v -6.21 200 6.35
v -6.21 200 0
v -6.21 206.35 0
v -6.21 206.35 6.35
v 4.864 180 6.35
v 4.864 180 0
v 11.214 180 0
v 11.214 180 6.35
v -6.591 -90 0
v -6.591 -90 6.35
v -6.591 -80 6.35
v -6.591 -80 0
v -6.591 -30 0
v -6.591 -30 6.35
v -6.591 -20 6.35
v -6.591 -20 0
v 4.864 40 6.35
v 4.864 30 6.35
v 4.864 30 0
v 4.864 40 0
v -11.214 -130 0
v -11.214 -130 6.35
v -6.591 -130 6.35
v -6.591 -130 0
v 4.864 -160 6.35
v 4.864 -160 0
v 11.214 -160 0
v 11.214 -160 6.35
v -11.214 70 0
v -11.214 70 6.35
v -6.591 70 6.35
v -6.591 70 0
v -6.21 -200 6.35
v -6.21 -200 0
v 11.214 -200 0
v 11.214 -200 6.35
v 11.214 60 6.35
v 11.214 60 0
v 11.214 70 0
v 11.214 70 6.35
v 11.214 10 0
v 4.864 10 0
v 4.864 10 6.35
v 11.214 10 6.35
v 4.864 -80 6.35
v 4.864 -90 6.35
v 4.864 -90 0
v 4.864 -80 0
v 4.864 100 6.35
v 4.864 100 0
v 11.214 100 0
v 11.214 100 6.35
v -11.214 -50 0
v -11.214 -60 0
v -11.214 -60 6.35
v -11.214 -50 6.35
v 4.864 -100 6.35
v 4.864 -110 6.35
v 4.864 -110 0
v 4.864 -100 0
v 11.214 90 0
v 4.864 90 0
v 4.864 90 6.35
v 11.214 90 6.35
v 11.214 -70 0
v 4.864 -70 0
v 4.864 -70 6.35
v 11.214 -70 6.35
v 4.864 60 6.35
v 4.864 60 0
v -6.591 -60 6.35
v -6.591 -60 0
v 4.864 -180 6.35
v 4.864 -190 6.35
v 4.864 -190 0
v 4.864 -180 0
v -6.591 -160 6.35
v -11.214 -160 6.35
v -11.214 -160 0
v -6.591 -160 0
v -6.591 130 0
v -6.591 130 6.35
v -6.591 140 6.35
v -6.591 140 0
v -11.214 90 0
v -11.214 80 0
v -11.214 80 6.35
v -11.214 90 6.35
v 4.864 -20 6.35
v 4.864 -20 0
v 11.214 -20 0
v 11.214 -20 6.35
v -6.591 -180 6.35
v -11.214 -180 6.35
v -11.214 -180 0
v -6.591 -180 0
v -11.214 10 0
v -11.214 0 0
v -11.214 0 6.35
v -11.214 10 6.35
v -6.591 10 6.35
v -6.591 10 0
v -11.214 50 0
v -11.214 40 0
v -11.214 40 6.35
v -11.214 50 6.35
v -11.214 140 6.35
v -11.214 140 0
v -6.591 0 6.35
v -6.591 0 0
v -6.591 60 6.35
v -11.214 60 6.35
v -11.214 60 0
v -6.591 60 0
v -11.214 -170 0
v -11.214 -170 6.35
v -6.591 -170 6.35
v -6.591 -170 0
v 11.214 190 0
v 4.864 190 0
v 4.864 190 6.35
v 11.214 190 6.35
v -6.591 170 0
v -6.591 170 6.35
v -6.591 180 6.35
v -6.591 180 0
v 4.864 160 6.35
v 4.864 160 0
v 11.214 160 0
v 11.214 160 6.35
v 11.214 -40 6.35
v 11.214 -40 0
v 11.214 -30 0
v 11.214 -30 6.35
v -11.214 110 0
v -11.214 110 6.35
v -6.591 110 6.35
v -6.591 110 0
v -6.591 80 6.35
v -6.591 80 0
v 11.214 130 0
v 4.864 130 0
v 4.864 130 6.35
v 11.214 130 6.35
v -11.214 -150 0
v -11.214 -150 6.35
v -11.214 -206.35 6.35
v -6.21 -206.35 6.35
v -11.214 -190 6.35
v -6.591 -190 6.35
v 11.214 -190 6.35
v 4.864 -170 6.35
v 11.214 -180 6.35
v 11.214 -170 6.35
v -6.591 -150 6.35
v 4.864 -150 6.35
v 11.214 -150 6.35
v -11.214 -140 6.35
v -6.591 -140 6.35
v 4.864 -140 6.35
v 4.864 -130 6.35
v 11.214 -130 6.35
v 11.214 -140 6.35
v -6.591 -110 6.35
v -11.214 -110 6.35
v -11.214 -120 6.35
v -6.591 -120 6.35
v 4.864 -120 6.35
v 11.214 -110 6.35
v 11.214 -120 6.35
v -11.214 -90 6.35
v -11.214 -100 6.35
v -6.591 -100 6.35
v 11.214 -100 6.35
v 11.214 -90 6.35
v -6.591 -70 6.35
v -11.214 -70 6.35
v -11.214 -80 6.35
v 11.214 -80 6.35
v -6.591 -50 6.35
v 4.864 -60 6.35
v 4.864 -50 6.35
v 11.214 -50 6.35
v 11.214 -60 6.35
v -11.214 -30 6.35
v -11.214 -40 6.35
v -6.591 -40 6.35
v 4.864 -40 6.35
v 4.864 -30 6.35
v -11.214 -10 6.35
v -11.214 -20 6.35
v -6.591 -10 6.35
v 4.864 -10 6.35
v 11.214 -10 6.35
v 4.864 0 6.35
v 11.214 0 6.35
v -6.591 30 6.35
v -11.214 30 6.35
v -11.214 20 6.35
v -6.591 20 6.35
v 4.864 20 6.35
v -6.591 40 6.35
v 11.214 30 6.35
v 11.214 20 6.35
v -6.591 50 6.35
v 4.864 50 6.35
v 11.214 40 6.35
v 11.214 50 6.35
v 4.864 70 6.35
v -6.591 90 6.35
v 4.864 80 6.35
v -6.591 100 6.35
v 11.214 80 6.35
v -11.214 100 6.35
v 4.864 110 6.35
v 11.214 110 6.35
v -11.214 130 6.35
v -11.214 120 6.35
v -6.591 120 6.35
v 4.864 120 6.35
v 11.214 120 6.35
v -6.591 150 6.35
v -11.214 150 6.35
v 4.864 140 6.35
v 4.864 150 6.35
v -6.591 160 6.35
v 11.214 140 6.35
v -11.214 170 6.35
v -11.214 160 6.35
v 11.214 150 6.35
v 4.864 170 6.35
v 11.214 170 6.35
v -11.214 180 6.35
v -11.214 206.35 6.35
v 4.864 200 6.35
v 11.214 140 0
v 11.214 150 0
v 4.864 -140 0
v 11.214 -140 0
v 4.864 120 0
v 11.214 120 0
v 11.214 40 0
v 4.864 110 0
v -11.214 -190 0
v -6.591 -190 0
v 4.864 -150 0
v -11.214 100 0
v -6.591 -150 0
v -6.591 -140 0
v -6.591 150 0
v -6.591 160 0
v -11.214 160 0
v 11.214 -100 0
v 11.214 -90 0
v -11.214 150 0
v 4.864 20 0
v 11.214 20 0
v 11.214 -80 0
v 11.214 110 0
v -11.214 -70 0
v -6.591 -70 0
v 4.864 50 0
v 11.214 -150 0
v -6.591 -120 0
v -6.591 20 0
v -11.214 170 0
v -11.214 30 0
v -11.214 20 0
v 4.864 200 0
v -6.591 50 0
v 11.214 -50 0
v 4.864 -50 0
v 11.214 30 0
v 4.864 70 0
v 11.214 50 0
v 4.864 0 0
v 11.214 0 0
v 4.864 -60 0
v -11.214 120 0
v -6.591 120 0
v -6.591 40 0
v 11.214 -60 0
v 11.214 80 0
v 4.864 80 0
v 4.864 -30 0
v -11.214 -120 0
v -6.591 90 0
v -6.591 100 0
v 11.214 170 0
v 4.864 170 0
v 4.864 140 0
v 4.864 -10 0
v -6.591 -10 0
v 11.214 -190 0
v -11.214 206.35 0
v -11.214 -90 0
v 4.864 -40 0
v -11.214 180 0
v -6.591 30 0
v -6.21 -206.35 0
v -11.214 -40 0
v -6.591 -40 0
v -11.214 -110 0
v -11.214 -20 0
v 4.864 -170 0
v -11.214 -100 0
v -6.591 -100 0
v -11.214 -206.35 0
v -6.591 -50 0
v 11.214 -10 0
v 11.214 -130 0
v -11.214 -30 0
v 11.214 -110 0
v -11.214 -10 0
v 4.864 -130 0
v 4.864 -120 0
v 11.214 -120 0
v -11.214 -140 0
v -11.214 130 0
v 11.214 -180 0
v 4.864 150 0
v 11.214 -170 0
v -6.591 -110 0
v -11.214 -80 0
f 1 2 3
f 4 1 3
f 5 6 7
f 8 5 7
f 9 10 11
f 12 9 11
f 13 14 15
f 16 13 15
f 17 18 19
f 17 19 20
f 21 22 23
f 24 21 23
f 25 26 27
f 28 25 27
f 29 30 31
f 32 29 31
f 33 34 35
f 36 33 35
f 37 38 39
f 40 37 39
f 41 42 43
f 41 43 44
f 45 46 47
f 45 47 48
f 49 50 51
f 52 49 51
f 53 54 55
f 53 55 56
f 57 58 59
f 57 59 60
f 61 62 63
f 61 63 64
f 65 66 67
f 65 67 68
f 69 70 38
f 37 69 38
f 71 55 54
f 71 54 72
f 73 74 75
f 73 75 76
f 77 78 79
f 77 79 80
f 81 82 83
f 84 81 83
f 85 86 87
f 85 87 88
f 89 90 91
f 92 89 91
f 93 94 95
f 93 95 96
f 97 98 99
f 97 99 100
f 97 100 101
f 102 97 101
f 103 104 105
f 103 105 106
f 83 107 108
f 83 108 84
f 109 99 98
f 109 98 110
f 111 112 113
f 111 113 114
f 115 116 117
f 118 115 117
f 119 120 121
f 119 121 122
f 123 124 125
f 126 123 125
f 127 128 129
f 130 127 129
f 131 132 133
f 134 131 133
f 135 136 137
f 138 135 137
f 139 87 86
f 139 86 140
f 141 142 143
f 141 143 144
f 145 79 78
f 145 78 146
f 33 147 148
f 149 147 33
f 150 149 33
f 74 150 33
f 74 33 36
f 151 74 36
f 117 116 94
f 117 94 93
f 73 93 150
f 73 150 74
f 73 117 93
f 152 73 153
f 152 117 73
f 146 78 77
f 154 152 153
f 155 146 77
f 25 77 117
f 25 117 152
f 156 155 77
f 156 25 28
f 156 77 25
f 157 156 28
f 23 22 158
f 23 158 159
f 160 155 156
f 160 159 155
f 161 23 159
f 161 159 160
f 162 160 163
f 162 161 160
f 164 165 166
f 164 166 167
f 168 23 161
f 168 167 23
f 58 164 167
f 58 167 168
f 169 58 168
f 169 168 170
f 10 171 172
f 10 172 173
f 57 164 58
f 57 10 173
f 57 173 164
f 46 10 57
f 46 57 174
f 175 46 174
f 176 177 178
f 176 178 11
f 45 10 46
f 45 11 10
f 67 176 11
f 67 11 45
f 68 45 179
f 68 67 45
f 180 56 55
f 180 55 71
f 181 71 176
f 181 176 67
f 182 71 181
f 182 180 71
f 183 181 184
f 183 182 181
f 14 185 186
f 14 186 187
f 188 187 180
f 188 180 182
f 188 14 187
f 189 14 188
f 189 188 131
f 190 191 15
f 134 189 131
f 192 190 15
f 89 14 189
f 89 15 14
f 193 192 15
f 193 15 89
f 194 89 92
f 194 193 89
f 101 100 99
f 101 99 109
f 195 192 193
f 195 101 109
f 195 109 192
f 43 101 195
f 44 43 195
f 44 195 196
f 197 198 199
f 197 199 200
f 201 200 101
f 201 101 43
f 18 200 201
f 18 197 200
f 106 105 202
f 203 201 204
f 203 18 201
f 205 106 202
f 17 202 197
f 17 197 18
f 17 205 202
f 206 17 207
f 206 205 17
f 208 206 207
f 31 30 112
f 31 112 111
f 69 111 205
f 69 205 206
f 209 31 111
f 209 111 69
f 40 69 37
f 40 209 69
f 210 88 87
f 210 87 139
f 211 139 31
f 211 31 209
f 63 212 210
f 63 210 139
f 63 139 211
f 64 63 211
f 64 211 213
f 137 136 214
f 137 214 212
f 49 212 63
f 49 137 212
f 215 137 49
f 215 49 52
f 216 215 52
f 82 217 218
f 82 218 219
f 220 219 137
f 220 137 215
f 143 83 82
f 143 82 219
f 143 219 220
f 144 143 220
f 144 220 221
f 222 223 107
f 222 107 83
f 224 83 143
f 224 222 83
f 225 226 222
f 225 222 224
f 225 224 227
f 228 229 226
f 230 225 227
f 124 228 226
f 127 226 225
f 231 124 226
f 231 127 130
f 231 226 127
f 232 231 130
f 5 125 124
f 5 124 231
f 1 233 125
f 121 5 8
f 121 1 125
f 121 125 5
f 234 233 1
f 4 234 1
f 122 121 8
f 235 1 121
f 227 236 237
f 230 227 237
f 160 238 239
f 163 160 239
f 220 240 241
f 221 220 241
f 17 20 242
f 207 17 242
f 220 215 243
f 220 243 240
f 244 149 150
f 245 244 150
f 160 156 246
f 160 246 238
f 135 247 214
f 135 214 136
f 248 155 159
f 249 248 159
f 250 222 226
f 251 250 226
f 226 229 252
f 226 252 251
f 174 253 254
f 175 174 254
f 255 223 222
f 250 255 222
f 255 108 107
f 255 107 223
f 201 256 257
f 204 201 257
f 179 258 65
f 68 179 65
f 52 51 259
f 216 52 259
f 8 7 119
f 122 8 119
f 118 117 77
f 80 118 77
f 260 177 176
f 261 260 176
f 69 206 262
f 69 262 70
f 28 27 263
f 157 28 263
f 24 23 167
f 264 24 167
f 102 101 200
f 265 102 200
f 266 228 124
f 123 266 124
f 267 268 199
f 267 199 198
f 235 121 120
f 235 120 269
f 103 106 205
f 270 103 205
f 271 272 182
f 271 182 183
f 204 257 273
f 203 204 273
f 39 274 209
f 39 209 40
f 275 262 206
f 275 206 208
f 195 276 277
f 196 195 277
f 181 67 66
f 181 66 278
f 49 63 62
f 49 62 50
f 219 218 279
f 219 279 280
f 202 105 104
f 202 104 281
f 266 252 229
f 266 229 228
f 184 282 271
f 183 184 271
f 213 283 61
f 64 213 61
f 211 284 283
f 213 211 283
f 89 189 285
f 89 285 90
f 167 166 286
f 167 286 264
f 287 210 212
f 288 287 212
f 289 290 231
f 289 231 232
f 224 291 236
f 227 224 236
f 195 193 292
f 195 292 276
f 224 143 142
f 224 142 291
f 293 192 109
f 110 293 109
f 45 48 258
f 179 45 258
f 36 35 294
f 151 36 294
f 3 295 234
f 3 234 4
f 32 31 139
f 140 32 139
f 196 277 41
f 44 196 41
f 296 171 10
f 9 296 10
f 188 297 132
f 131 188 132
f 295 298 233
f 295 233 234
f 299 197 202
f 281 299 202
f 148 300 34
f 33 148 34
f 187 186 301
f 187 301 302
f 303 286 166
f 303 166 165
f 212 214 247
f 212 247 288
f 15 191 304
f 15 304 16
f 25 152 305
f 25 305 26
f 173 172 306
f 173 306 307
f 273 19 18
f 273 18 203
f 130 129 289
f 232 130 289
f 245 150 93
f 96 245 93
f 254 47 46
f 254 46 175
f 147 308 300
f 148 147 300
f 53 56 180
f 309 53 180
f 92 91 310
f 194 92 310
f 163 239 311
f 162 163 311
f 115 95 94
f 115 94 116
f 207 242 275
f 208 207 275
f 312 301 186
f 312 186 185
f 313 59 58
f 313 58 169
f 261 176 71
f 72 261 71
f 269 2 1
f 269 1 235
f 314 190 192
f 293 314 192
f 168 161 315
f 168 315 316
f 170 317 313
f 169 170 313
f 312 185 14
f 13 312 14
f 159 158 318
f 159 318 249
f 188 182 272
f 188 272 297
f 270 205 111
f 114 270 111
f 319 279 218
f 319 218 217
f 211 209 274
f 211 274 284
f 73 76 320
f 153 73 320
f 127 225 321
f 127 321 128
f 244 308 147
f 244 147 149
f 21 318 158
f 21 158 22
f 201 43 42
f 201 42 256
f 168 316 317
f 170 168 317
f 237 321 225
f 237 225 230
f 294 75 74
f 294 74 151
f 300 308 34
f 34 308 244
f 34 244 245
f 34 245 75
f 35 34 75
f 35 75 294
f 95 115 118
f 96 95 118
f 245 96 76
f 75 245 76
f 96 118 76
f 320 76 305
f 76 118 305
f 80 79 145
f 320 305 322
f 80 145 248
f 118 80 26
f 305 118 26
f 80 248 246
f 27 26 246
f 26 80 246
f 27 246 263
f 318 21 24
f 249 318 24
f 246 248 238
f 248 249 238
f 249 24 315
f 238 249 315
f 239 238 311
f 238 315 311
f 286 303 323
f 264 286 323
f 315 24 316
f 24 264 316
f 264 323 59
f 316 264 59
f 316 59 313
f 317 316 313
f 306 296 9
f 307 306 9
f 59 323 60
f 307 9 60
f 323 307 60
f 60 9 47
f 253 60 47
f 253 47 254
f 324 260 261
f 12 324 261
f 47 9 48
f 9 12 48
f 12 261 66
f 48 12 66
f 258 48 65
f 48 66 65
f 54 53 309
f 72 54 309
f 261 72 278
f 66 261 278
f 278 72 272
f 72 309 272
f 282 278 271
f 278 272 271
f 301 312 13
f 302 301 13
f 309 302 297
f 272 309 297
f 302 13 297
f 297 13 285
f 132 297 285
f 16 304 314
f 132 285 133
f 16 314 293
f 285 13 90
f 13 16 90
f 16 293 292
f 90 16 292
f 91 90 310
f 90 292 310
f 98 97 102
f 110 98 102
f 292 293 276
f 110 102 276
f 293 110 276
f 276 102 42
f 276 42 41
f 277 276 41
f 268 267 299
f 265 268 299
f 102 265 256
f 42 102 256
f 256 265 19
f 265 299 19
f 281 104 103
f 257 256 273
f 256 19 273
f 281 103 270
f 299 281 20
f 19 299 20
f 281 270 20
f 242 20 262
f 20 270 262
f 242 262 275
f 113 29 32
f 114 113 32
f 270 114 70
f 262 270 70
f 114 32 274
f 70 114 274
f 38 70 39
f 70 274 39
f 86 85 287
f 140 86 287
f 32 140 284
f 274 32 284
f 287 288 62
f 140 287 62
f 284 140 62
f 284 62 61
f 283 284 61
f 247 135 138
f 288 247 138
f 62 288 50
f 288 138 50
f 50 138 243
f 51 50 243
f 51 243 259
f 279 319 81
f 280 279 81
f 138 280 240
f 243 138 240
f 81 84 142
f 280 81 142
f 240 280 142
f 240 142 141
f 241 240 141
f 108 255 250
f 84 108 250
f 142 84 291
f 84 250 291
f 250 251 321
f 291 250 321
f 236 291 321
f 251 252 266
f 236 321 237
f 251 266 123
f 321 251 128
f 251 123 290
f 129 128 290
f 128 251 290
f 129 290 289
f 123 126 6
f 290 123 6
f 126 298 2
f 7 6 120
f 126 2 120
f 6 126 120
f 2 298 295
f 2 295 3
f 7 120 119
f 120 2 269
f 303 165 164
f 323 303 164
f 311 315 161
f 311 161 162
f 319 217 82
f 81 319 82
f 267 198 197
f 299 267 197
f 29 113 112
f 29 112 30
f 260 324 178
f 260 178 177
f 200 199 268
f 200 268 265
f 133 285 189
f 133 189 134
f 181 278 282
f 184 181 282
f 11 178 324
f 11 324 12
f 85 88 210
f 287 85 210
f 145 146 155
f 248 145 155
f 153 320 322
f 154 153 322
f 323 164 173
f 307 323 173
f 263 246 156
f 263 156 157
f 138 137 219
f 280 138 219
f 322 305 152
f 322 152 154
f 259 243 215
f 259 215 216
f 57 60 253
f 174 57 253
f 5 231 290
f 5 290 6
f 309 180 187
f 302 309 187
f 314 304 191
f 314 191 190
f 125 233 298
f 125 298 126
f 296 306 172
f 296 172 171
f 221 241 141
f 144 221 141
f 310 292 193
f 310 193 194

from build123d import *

# Parameters (mm, degrees)
SKETCH1_W           = 22.4282
SKETCH1_H           = 400
BOSS_EXTRUDE1_DEPTH = 6.35
SKETCH2_W           = 4.6228
SKETCH2_H           = 10
CUT_EXTRUDE2_DEPTH  = 6.35
SKETCH13_W          = 6.35
SKETCH13_H          = 10
CUT_EXTRUDE4_DEPTH  = 6.35
LPATTERN1_COUNT     = 19
LPATTERN1_PITCH     = 20
LPATTERN2_COUNT     = 20
LPATTERN2_PITCH     = 20
SKETCH14_W          = 5.0038
SKETCH14_H          = 6.35
BOSS_EXTRUDE4_DEPTH = 6.35


with BuildPart() as part:
    # Sketch1 → Boss-Extrude1 (new body)
    with BuildSketch(Plane.XY):
        Rectangle(SKETCH1_W, SKETCH1_H)
    extrude(amount=BOSS_EXTRUDE1_DEPTH)

    # Sketch2 → Cut-Extrude2 (cut)
    with BuildSketch(Plane.XY.offset(6.35)):
        with Locations((-8.9027, -185)):
            Rectangle(SKETCH2_W, SKETCH2_H)
    cut_extrude2 = extrude(amount=-CUT_EXTRUDE2_DEPTH, mode=Mode.SUBTRACT)

    # Sketch13 → Cut-Extrude4 (cut)
    with BuildSketch(Plane.XY.offset(6.35)):
        with Locations((8.0391, -185)):
            Rectangle(SKETCH13_W, SKETCH13_H)
    cut_extrude4 = extrude(amount=-CUT_EXTRUDE4_DEPTH, mode=Mode.SUBTRACT)

    # LPattern1: Cut-Extrude2 ×19
    with Locations(*[(0, i * LPATTERN1_PITCH, 0) for i in range(1, LPATTERN1_COUNT)]):
        add(cut_extrude2, mode=Mode.SUBTRACT)

    # LPattern2: Cut-Extrude4 ×20
    with Locations(*[(0, i * LPATTERN2_PITCH, 0) for i in range(1, LPATTERN2_COUNT)]):
        add(cut_extrude4, mode=Mode.SUBTRACT)

    # Sketch14 → Boss-Extrude4 (add)
    with BuildSketch(Plane.XY):
        with Locations((-8.7122, 203.175)):
            Rectangle(SKETCH14_W, SKETCH14_H)
        with Locations((-8.7122, -203.175)):
            Rectangle(SKETCH14_W, SKETCH14_H)
    extrude(amount=BOSS_EXTRUDE4_DEPTH)


solid = part.part
